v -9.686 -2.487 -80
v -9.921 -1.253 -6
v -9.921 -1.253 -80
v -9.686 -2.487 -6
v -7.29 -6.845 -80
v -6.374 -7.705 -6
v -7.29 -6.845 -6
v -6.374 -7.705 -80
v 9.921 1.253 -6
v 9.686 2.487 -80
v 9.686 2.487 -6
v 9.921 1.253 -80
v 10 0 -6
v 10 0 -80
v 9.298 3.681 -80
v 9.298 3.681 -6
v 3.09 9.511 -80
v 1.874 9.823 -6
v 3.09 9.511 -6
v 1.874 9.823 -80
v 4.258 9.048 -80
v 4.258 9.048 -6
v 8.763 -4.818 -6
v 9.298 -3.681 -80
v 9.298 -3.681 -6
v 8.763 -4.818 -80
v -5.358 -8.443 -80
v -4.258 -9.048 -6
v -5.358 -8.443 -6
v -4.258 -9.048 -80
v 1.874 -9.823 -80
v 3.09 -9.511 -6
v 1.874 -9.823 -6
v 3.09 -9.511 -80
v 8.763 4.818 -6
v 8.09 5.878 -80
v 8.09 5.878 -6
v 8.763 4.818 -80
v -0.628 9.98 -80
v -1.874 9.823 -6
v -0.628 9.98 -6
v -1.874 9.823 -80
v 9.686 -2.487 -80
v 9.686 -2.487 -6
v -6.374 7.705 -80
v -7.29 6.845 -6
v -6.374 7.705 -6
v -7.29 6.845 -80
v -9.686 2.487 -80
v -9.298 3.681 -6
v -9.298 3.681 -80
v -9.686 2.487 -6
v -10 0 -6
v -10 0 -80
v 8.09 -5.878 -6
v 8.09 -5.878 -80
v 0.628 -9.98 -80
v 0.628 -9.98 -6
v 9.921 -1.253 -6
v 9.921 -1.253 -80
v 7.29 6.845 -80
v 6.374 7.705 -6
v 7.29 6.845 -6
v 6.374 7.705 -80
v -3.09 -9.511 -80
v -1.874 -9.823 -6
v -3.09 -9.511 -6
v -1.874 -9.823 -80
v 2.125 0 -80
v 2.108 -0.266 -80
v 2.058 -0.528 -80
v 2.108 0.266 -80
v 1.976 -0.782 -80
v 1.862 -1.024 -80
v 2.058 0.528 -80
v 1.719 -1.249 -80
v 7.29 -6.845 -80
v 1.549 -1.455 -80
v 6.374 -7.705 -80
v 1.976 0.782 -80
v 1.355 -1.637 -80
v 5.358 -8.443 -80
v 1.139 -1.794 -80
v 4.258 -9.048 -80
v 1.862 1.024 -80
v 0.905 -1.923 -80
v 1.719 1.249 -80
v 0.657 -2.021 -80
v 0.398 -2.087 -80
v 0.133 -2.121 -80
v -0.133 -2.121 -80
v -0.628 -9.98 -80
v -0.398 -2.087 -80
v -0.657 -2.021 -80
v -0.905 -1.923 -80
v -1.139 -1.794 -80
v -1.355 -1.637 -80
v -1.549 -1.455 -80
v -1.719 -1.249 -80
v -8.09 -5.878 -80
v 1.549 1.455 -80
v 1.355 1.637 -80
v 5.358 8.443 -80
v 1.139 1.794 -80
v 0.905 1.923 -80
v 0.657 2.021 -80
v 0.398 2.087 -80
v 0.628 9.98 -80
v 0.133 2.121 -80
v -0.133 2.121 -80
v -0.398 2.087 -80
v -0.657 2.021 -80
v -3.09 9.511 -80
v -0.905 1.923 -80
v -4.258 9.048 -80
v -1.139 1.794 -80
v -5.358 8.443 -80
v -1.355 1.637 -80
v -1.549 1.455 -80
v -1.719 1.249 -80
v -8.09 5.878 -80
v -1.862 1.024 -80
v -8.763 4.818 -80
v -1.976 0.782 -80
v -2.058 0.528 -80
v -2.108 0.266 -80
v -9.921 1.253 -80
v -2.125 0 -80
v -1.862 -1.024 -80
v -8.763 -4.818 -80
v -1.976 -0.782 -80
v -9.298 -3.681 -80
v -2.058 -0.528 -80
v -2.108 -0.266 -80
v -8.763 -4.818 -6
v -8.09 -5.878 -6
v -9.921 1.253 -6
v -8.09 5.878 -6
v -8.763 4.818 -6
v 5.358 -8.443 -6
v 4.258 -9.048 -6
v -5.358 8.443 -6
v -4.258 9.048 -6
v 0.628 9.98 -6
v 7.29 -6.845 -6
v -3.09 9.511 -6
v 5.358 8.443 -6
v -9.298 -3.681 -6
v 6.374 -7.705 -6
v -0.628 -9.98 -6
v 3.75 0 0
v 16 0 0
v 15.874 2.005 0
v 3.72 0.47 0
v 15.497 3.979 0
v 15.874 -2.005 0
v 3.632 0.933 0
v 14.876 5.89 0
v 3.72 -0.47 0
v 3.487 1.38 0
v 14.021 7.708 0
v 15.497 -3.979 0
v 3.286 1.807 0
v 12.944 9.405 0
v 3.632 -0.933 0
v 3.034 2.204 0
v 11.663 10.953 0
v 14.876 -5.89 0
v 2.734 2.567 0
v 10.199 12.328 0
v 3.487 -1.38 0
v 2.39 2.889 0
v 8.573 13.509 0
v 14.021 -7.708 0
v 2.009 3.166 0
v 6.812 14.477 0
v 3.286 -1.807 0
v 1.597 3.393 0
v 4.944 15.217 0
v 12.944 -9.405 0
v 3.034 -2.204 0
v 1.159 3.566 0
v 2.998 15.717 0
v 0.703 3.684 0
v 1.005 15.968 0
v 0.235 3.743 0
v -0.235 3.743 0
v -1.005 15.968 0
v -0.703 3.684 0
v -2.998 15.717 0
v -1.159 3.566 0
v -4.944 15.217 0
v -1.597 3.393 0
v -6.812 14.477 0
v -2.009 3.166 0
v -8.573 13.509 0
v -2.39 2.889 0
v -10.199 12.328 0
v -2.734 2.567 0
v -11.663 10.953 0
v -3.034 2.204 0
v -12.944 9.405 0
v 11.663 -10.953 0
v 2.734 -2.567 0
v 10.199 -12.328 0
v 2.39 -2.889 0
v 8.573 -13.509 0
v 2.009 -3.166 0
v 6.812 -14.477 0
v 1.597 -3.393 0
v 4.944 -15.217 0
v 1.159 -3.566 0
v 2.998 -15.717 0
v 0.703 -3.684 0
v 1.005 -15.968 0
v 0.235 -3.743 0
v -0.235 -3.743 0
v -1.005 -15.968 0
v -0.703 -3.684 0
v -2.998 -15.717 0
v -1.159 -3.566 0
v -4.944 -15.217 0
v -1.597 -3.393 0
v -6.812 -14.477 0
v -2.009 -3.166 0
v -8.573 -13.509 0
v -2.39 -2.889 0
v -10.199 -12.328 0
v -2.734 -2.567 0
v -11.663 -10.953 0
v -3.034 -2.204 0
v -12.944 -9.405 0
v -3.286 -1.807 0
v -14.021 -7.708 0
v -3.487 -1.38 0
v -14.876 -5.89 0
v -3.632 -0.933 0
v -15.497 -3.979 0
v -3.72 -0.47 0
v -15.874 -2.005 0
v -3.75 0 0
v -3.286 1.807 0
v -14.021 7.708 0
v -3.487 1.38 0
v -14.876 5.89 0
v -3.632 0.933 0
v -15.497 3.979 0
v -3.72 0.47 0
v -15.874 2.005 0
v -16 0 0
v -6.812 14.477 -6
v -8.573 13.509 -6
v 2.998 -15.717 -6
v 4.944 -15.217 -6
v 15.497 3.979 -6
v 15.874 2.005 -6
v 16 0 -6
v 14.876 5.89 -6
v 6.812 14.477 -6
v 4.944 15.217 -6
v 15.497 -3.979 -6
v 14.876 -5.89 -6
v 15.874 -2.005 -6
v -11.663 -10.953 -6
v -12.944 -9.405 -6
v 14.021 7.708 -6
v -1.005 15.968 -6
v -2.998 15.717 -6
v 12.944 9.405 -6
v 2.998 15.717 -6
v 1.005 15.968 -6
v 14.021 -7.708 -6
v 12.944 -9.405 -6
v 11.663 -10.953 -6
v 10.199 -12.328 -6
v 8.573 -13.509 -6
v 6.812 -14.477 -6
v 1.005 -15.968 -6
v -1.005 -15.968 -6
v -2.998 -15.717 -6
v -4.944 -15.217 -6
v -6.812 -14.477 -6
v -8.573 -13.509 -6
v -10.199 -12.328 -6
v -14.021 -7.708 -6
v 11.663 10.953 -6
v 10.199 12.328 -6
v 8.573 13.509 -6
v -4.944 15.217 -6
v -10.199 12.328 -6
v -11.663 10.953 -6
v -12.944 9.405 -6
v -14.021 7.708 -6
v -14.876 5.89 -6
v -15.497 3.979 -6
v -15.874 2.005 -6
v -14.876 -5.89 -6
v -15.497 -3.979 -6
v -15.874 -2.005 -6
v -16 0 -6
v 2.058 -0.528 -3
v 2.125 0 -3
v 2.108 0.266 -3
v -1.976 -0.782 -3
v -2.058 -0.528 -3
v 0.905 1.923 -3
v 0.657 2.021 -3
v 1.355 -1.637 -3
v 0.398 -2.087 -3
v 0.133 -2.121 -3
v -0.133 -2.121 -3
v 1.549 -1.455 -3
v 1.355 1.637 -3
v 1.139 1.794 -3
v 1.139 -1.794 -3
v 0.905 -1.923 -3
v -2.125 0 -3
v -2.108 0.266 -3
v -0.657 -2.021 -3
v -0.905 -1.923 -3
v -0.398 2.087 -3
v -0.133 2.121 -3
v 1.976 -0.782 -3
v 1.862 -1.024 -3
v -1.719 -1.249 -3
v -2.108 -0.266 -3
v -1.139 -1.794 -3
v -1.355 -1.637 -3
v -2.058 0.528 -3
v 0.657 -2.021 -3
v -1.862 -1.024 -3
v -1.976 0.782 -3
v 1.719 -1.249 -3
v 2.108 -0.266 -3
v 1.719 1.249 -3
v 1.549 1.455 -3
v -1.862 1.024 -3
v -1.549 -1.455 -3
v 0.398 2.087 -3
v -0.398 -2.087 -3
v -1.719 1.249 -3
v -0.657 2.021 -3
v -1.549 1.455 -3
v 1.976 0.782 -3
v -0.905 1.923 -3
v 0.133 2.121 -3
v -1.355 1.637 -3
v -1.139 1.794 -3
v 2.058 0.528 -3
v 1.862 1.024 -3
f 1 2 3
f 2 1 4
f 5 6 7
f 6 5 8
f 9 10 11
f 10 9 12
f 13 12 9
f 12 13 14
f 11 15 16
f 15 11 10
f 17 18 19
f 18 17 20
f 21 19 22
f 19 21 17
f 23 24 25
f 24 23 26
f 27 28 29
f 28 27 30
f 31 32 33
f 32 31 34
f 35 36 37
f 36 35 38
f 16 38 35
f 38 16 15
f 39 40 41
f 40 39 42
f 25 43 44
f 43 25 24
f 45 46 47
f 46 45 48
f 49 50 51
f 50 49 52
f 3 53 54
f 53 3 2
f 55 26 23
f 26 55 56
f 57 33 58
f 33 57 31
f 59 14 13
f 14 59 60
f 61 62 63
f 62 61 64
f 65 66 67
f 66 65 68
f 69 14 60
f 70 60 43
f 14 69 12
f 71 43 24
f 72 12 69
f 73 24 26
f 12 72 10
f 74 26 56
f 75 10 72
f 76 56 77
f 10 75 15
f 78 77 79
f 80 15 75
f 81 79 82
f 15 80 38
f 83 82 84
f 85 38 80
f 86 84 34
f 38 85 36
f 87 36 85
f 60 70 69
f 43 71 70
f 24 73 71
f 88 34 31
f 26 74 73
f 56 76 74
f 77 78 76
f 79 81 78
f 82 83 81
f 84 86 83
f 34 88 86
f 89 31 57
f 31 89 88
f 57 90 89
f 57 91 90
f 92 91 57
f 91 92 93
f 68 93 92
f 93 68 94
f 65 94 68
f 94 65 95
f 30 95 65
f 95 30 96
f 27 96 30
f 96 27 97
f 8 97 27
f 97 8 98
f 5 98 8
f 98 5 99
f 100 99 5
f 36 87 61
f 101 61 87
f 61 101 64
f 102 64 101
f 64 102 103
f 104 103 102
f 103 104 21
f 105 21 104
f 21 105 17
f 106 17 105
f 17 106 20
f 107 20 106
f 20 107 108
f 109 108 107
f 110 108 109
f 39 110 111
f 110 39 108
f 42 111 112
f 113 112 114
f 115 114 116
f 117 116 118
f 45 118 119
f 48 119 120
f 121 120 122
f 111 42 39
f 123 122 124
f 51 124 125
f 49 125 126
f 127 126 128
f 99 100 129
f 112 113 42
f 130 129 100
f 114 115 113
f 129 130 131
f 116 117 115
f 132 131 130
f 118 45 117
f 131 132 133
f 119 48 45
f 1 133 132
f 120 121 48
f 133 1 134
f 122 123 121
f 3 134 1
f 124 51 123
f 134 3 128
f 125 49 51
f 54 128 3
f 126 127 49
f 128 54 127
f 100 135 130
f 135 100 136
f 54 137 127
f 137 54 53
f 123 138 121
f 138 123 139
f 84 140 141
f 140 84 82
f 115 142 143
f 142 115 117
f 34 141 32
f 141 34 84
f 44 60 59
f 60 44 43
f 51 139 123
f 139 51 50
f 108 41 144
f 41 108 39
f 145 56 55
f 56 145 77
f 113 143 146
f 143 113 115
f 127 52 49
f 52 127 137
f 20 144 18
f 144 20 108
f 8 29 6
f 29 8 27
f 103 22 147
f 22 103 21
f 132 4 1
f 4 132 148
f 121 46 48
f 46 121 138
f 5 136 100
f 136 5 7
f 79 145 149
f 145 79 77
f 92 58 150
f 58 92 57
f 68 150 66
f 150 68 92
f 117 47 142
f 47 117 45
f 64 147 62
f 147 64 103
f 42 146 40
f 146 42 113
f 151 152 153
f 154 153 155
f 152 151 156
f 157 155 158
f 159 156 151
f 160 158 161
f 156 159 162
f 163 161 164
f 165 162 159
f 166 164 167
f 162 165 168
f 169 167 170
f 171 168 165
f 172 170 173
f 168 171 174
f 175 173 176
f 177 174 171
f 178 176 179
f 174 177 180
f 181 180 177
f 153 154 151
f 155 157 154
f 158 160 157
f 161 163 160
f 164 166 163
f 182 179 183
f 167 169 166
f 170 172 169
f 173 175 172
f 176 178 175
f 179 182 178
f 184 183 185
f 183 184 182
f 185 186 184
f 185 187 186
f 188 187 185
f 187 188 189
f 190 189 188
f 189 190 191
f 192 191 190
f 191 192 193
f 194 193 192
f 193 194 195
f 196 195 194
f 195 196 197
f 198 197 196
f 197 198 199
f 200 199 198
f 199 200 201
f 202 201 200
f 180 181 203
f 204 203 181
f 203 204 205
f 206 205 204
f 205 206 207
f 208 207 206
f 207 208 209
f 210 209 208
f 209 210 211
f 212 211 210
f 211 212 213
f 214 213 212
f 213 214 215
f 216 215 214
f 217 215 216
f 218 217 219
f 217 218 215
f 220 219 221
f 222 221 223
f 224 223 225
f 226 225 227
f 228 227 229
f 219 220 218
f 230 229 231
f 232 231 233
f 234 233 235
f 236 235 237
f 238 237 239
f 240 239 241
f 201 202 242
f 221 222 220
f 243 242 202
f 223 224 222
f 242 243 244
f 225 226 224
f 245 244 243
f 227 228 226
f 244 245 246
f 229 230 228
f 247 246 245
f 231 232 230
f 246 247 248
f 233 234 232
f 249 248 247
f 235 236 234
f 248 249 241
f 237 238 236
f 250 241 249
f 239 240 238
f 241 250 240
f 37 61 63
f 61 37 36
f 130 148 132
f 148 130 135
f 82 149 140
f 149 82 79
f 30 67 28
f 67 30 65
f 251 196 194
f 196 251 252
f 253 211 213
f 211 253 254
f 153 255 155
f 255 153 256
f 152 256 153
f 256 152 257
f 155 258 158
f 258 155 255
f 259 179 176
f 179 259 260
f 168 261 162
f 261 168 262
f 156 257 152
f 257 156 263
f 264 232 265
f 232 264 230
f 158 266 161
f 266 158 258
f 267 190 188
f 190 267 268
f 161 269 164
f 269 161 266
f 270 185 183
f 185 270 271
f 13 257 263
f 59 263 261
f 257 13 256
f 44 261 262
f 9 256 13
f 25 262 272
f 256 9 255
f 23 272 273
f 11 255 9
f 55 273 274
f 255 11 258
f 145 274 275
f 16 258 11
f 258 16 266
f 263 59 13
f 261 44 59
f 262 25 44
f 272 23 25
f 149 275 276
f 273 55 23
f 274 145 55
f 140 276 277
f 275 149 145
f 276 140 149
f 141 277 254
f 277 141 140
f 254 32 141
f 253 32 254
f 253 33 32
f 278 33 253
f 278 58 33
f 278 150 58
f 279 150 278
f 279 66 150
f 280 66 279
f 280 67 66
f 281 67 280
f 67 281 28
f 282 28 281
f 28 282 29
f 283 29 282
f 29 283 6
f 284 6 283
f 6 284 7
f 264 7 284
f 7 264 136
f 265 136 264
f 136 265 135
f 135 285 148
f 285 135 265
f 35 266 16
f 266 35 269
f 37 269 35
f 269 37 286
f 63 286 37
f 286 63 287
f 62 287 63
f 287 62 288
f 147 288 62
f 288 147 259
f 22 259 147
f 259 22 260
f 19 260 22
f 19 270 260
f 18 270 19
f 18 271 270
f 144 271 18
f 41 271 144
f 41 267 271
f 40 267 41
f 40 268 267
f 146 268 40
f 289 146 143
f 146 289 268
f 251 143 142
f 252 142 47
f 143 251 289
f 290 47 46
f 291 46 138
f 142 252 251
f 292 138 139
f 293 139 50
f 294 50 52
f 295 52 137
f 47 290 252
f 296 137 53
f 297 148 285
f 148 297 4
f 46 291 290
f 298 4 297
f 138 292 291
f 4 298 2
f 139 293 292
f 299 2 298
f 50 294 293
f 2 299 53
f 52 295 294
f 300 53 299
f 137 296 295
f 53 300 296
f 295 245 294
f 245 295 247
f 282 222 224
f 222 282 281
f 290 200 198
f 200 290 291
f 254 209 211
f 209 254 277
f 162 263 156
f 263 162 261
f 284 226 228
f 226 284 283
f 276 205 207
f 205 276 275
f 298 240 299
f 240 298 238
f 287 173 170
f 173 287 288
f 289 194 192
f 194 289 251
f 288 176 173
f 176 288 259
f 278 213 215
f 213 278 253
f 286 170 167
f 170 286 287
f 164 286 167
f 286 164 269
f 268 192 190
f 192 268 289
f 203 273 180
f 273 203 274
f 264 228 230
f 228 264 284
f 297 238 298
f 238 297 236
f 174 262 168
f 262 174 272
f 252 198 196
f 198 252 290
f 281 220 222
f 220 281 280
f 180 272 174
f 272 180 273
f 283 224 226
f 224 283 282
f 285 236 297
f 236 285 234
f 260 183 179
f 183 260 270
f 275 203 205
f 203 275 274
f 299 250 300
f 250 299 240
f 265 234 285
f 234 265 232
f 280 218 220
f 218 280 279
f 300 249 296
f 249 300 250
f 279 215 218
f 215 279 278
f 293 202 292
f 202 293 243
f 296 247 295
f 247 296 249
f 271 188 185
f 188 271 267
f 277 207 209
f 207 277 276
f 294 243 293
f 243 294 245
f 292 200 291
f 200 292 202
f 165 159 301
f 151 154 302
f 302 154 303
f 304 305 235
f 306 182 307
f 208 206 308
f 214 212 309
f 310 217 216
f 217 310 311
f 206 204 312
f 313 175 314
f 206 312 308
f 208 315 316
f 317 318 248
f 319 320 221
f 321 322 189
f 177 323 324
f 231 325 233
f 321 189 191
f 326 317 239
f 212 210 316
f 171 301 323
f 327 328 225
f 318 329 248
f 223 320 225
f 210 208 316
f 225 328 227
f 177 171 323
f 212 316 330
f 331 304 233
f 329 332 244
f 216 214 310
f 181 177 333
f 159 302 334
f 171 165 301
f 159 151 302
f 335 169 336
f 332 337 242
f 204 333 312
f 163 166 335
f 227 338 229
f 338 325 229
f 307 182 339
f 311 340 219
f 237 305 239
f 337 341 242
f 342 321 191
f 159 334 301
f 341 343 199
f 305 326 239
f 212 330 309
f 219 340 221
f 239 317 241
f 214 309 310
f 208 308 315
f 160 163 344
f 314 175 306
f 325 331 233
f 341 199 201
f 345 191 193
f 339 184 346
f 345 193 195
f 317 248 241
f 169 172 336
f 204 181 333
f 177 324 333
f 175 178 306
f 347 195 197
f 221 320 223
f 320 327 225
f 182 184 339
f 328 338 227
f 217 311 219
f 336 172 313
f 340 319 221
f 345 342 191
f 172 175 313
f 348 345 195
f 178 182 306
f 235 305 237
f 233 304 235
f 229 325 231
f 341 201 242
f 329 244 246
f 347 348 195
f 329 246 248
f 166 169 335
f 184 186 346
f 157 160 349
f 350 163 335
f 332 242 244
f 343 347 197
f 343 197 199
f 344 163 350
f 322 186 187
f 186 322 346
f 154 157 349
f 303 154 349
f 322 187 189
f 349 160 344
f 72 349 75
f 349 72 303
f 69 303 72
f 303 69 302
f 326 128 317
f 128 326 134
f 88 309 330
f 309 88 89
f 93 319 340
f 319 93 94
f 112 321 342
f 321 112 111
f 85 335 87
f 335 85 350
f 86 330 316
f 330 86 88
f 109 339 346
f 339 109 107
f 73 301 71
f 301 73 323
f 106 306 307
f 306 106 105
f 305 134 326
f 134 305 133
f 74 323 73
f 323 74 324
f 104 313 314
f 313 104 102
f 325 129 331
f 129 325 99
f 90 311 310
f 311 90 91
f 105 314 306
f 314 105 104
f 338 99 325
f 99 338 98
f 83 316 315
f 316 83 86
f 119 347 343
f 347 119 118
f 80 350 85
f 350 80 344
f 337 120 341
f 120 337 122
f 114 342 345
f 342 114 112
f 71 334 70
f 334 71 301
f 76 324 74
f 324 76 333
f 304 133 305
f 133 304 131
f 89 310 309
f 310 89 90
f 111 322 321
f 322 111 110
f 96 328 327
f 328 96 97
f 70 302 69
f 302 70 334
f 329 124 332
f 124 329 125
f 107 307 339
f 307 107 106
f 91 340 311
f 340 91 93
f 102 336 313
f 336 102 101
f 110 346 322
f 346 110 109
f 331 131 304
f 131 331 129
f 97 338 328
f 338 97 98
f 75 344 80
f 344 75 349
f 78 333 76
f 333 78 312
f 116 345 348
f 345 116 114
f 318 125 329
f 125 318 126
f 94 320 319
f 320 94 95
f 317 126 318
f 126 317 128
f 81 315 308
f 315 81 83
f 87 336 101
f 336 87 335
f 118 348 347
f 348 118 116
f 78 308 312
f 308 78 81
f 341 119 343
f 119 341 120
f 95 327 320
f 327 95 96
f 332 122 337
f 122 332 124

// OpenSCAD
$fn = 50;


difference() {
	union() {
		translate(v = [0, 0, -80.0000000000]) {
			cylinder(h = 80, r = 10.0000000000);
		}
		translate(v = [0, 0, -6.0000000000]) {
			cylinder(h = 6, r = 16.0000000000);
		}
	}
	union() {
		translate(v = [0, 0, 0]) {
			rotate(a = [0, 0, 0]) {
				difference() {
					union() {
						#translate(v = [0, 0, -80.0000000000]) {
							cylinder(h = 80, r = 2.0000000000);
						}
						#translate(v = [0, 0, -3]) {
							cylinder(h = 3, r1 = 2.1250000000, r2 = 3.7500000000);
						}
						#translate(v = [0, 0, -80.0000000000]) {
							cylinder(h = 80, r = 2.1250000000);
						}
						#translate(v = [0, 0, -80.0000000000]) {
							cylinder(h = 80, r = 2.0000000000);
						}
					}
					union();
				}
			}
		}
	}
}
